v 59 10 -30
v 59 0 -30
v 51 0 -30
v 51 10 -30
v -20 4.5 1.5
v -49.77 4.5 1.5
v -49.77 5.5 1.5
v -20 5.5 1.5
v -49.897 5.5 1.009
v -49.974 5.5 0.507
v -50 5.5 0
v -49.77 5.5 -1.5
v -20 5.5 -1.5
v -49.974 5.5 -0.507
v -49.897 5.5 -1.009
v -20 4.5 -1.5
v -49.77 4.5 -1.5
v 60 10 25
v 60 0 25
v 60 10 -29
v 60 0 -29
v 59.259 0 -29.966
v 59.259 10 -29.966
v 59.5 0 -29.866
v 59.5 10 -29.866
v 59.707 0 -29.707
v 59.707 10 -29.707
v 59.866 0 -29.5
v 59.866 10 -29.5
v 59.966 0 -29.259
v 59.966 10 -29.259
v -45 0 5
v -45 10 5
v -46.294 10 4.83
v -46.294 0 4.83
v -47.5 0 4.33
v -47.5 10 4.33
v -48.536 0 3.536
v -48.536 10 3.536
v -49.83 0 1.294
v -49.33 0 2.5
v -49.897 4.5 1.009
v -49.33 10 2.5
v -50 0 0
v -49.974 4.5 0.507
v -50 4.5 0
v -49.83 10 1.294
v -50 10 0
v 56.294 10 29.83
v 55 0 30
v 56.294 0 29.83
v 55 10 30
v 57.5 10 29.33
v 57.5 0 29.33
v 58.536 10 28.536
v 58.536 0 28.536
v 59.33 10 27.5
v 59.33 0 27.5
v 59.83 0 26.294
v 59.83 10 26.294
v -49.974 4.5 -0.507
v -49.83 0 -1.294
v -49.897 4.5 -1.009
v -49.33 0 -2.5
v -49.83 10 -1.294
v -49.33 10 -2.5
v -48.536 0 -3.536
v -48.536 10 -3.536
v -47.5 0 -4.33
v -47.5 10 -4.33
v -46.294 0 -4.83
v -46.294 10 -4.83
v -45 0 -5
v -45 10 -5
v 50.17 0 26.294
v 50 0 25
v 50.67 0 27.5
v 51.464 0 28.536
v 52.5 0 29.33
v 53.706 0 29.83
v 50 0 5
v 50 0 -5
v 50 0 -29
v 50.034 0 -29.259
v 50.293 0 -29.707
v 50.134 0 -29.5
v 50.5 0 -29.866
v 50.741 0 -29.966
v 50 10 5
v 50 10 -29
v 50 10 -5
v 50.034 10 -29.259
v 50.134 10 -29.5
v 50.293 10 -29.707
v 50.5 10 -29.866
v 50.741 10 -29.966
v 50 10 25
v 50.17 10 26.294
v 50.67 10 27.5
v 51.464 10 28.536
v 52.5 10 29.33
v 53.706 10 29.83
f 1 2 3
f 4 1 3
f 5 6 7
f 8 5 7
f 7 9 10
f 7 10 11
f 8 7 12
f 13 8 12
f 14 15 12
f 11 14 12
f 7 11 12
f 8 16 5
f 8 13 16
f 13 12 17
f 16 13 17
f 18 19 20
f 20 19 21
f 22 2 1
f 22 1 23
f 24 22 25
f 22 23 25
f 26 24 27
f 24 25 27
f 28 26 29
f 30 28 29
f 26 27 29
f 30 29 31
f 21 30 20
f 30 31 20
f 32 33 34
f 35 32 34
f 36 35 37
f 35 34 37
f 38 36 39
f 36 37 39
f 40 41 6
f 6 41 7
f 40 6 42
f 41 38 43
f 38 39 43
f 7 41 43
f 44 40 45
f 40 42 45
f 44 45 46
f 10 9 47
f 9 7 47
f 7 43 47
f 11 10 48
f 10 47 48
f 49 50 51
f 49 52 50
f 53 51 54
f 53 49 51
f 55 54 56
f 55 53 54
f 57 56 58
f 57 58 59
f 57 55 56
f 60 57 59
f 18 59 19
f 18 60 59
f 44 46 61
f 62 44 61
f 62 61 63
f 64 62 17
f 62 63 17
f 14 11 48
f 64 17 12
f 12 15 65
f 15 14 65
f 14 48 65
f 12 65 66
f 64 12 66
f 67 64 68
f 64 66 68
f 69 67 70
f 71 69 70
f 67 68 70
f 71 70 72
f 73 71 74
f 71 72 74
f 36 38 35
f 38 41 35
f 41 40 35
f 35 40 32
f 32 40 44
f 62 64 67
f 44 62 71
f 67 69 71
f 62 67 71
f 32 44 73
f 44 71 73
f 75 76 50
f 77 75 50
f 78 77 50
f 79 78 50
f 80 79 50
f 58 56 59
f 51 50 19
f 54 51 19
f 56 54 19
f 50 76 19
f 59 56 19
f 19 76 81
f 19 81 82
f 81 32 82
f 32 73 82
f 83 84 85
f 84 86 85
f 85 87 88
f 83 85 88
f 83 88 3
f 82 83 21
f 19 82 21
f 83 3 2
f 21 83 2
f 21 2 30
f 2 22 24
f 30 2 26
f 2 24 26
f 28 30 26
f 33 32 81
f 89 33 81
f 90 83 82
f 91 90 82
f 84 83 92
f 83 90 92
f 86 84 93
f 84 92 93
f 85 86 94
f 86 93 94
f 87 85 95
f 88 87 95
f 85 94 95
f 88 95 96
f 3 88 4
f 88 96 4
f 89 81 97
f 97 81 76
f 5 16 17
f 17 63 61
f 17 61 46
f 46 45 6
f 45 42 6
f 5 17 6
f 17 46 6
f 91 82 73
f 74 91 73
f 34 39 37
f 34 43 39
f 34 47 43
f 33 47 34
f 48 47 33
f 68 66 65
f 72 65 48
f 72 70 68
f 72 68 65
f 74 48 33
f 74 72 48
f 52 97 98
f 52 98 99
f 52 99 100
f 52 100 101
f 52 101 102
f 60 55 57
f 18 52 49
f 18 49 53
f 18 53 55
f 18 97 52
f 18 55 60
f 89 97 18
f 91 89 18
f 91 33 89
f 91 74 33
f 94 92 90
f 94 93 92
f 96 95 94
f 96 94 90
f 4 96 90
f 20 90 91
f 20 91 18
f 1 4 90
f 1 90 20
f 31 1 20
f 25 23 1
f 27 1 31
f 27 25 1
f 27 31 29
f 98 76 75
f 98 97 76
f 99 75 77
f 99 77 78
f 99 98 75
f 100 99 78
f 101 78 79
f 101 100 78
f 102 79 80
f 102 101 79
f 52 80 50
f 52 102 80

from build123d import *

# Parameters (mm, degrees)
BOSS_EXTRU_1_DEPTH      = 10
CONG_3_R                = 5
CONG_4_R                = 5
CONG_5_R                = 1
CONG_6_R                = 1
ENL_V_MAT_EXTRU_1_DEPTH = 30


with BuildPart() as part:
    # Esquisse1 → Boss.-Extru.1 (new body)
    with BuildSketch(Plane(origin=(0, 0, 0), x_dir=(1, 0, 0), z_dir=(0, 1, 0))):
        Polygon((50, 30), (50, 5), (-50, 5), (-50, -5), (50, -5), (50, -30), (60, -30), (60, 30), align=None)
    extrude(amount=BOSS_EXTRU_1_DEPTH)

    # Congé3
    cong_3_edges = [part.edges().sort_by_distance(p)[0] for p in [
        (60, 5, 30),
        (50, 5, 30),
    ]]
    fillet(cong_3_edges, radius=CONG_3_R - 0.0001)  # a hair under: the kernel refuses the full size

    # Congé4
    cong_4_edges = [part.edges().sort_by_distance(p)[0] for p in [
        (-50, 5, 5),
        (-50, 5, -5),
    ]]
    fillet(cong_4_edges, radius=CONG_4_R - 0.0001)  # a hair under: the kernel refuses the full size

    # Congé5
    cong_5_edges = [part.edges().sort_by_distance(p)[0] for p in [
        (50, 5, -30),
    ]]
    fillet(cong_5_edges, radius=CONG_5_R)

    # Congé6
    cong_6_edges = [part.edges().sort_by_distance(p)[0] for p in [
        (60, 5, -30),
    ]]
    fillet(cong_6_edges, radius=CONG_6_R)

    # Esquisse3D1 → Enlèv. mat.-Extru.1 (cut)
    with BuildSketch(Plane(origin=(-50, 4.5, -1.5), x_dir=(0, 0.3162277660168382, 0.9486832980505138), z_dir=(-1, 0, 0))):
        Polygon((0, 0), (2.846049894, -0.948683298), (3.16227766, 0), (0.316227766, 0.948683298), align=None)
    extrude(amount=-ENL_V_MAT_EXTRU_1_DEPTH, mode=Mode.SUBTRACT)


solid = part.part
